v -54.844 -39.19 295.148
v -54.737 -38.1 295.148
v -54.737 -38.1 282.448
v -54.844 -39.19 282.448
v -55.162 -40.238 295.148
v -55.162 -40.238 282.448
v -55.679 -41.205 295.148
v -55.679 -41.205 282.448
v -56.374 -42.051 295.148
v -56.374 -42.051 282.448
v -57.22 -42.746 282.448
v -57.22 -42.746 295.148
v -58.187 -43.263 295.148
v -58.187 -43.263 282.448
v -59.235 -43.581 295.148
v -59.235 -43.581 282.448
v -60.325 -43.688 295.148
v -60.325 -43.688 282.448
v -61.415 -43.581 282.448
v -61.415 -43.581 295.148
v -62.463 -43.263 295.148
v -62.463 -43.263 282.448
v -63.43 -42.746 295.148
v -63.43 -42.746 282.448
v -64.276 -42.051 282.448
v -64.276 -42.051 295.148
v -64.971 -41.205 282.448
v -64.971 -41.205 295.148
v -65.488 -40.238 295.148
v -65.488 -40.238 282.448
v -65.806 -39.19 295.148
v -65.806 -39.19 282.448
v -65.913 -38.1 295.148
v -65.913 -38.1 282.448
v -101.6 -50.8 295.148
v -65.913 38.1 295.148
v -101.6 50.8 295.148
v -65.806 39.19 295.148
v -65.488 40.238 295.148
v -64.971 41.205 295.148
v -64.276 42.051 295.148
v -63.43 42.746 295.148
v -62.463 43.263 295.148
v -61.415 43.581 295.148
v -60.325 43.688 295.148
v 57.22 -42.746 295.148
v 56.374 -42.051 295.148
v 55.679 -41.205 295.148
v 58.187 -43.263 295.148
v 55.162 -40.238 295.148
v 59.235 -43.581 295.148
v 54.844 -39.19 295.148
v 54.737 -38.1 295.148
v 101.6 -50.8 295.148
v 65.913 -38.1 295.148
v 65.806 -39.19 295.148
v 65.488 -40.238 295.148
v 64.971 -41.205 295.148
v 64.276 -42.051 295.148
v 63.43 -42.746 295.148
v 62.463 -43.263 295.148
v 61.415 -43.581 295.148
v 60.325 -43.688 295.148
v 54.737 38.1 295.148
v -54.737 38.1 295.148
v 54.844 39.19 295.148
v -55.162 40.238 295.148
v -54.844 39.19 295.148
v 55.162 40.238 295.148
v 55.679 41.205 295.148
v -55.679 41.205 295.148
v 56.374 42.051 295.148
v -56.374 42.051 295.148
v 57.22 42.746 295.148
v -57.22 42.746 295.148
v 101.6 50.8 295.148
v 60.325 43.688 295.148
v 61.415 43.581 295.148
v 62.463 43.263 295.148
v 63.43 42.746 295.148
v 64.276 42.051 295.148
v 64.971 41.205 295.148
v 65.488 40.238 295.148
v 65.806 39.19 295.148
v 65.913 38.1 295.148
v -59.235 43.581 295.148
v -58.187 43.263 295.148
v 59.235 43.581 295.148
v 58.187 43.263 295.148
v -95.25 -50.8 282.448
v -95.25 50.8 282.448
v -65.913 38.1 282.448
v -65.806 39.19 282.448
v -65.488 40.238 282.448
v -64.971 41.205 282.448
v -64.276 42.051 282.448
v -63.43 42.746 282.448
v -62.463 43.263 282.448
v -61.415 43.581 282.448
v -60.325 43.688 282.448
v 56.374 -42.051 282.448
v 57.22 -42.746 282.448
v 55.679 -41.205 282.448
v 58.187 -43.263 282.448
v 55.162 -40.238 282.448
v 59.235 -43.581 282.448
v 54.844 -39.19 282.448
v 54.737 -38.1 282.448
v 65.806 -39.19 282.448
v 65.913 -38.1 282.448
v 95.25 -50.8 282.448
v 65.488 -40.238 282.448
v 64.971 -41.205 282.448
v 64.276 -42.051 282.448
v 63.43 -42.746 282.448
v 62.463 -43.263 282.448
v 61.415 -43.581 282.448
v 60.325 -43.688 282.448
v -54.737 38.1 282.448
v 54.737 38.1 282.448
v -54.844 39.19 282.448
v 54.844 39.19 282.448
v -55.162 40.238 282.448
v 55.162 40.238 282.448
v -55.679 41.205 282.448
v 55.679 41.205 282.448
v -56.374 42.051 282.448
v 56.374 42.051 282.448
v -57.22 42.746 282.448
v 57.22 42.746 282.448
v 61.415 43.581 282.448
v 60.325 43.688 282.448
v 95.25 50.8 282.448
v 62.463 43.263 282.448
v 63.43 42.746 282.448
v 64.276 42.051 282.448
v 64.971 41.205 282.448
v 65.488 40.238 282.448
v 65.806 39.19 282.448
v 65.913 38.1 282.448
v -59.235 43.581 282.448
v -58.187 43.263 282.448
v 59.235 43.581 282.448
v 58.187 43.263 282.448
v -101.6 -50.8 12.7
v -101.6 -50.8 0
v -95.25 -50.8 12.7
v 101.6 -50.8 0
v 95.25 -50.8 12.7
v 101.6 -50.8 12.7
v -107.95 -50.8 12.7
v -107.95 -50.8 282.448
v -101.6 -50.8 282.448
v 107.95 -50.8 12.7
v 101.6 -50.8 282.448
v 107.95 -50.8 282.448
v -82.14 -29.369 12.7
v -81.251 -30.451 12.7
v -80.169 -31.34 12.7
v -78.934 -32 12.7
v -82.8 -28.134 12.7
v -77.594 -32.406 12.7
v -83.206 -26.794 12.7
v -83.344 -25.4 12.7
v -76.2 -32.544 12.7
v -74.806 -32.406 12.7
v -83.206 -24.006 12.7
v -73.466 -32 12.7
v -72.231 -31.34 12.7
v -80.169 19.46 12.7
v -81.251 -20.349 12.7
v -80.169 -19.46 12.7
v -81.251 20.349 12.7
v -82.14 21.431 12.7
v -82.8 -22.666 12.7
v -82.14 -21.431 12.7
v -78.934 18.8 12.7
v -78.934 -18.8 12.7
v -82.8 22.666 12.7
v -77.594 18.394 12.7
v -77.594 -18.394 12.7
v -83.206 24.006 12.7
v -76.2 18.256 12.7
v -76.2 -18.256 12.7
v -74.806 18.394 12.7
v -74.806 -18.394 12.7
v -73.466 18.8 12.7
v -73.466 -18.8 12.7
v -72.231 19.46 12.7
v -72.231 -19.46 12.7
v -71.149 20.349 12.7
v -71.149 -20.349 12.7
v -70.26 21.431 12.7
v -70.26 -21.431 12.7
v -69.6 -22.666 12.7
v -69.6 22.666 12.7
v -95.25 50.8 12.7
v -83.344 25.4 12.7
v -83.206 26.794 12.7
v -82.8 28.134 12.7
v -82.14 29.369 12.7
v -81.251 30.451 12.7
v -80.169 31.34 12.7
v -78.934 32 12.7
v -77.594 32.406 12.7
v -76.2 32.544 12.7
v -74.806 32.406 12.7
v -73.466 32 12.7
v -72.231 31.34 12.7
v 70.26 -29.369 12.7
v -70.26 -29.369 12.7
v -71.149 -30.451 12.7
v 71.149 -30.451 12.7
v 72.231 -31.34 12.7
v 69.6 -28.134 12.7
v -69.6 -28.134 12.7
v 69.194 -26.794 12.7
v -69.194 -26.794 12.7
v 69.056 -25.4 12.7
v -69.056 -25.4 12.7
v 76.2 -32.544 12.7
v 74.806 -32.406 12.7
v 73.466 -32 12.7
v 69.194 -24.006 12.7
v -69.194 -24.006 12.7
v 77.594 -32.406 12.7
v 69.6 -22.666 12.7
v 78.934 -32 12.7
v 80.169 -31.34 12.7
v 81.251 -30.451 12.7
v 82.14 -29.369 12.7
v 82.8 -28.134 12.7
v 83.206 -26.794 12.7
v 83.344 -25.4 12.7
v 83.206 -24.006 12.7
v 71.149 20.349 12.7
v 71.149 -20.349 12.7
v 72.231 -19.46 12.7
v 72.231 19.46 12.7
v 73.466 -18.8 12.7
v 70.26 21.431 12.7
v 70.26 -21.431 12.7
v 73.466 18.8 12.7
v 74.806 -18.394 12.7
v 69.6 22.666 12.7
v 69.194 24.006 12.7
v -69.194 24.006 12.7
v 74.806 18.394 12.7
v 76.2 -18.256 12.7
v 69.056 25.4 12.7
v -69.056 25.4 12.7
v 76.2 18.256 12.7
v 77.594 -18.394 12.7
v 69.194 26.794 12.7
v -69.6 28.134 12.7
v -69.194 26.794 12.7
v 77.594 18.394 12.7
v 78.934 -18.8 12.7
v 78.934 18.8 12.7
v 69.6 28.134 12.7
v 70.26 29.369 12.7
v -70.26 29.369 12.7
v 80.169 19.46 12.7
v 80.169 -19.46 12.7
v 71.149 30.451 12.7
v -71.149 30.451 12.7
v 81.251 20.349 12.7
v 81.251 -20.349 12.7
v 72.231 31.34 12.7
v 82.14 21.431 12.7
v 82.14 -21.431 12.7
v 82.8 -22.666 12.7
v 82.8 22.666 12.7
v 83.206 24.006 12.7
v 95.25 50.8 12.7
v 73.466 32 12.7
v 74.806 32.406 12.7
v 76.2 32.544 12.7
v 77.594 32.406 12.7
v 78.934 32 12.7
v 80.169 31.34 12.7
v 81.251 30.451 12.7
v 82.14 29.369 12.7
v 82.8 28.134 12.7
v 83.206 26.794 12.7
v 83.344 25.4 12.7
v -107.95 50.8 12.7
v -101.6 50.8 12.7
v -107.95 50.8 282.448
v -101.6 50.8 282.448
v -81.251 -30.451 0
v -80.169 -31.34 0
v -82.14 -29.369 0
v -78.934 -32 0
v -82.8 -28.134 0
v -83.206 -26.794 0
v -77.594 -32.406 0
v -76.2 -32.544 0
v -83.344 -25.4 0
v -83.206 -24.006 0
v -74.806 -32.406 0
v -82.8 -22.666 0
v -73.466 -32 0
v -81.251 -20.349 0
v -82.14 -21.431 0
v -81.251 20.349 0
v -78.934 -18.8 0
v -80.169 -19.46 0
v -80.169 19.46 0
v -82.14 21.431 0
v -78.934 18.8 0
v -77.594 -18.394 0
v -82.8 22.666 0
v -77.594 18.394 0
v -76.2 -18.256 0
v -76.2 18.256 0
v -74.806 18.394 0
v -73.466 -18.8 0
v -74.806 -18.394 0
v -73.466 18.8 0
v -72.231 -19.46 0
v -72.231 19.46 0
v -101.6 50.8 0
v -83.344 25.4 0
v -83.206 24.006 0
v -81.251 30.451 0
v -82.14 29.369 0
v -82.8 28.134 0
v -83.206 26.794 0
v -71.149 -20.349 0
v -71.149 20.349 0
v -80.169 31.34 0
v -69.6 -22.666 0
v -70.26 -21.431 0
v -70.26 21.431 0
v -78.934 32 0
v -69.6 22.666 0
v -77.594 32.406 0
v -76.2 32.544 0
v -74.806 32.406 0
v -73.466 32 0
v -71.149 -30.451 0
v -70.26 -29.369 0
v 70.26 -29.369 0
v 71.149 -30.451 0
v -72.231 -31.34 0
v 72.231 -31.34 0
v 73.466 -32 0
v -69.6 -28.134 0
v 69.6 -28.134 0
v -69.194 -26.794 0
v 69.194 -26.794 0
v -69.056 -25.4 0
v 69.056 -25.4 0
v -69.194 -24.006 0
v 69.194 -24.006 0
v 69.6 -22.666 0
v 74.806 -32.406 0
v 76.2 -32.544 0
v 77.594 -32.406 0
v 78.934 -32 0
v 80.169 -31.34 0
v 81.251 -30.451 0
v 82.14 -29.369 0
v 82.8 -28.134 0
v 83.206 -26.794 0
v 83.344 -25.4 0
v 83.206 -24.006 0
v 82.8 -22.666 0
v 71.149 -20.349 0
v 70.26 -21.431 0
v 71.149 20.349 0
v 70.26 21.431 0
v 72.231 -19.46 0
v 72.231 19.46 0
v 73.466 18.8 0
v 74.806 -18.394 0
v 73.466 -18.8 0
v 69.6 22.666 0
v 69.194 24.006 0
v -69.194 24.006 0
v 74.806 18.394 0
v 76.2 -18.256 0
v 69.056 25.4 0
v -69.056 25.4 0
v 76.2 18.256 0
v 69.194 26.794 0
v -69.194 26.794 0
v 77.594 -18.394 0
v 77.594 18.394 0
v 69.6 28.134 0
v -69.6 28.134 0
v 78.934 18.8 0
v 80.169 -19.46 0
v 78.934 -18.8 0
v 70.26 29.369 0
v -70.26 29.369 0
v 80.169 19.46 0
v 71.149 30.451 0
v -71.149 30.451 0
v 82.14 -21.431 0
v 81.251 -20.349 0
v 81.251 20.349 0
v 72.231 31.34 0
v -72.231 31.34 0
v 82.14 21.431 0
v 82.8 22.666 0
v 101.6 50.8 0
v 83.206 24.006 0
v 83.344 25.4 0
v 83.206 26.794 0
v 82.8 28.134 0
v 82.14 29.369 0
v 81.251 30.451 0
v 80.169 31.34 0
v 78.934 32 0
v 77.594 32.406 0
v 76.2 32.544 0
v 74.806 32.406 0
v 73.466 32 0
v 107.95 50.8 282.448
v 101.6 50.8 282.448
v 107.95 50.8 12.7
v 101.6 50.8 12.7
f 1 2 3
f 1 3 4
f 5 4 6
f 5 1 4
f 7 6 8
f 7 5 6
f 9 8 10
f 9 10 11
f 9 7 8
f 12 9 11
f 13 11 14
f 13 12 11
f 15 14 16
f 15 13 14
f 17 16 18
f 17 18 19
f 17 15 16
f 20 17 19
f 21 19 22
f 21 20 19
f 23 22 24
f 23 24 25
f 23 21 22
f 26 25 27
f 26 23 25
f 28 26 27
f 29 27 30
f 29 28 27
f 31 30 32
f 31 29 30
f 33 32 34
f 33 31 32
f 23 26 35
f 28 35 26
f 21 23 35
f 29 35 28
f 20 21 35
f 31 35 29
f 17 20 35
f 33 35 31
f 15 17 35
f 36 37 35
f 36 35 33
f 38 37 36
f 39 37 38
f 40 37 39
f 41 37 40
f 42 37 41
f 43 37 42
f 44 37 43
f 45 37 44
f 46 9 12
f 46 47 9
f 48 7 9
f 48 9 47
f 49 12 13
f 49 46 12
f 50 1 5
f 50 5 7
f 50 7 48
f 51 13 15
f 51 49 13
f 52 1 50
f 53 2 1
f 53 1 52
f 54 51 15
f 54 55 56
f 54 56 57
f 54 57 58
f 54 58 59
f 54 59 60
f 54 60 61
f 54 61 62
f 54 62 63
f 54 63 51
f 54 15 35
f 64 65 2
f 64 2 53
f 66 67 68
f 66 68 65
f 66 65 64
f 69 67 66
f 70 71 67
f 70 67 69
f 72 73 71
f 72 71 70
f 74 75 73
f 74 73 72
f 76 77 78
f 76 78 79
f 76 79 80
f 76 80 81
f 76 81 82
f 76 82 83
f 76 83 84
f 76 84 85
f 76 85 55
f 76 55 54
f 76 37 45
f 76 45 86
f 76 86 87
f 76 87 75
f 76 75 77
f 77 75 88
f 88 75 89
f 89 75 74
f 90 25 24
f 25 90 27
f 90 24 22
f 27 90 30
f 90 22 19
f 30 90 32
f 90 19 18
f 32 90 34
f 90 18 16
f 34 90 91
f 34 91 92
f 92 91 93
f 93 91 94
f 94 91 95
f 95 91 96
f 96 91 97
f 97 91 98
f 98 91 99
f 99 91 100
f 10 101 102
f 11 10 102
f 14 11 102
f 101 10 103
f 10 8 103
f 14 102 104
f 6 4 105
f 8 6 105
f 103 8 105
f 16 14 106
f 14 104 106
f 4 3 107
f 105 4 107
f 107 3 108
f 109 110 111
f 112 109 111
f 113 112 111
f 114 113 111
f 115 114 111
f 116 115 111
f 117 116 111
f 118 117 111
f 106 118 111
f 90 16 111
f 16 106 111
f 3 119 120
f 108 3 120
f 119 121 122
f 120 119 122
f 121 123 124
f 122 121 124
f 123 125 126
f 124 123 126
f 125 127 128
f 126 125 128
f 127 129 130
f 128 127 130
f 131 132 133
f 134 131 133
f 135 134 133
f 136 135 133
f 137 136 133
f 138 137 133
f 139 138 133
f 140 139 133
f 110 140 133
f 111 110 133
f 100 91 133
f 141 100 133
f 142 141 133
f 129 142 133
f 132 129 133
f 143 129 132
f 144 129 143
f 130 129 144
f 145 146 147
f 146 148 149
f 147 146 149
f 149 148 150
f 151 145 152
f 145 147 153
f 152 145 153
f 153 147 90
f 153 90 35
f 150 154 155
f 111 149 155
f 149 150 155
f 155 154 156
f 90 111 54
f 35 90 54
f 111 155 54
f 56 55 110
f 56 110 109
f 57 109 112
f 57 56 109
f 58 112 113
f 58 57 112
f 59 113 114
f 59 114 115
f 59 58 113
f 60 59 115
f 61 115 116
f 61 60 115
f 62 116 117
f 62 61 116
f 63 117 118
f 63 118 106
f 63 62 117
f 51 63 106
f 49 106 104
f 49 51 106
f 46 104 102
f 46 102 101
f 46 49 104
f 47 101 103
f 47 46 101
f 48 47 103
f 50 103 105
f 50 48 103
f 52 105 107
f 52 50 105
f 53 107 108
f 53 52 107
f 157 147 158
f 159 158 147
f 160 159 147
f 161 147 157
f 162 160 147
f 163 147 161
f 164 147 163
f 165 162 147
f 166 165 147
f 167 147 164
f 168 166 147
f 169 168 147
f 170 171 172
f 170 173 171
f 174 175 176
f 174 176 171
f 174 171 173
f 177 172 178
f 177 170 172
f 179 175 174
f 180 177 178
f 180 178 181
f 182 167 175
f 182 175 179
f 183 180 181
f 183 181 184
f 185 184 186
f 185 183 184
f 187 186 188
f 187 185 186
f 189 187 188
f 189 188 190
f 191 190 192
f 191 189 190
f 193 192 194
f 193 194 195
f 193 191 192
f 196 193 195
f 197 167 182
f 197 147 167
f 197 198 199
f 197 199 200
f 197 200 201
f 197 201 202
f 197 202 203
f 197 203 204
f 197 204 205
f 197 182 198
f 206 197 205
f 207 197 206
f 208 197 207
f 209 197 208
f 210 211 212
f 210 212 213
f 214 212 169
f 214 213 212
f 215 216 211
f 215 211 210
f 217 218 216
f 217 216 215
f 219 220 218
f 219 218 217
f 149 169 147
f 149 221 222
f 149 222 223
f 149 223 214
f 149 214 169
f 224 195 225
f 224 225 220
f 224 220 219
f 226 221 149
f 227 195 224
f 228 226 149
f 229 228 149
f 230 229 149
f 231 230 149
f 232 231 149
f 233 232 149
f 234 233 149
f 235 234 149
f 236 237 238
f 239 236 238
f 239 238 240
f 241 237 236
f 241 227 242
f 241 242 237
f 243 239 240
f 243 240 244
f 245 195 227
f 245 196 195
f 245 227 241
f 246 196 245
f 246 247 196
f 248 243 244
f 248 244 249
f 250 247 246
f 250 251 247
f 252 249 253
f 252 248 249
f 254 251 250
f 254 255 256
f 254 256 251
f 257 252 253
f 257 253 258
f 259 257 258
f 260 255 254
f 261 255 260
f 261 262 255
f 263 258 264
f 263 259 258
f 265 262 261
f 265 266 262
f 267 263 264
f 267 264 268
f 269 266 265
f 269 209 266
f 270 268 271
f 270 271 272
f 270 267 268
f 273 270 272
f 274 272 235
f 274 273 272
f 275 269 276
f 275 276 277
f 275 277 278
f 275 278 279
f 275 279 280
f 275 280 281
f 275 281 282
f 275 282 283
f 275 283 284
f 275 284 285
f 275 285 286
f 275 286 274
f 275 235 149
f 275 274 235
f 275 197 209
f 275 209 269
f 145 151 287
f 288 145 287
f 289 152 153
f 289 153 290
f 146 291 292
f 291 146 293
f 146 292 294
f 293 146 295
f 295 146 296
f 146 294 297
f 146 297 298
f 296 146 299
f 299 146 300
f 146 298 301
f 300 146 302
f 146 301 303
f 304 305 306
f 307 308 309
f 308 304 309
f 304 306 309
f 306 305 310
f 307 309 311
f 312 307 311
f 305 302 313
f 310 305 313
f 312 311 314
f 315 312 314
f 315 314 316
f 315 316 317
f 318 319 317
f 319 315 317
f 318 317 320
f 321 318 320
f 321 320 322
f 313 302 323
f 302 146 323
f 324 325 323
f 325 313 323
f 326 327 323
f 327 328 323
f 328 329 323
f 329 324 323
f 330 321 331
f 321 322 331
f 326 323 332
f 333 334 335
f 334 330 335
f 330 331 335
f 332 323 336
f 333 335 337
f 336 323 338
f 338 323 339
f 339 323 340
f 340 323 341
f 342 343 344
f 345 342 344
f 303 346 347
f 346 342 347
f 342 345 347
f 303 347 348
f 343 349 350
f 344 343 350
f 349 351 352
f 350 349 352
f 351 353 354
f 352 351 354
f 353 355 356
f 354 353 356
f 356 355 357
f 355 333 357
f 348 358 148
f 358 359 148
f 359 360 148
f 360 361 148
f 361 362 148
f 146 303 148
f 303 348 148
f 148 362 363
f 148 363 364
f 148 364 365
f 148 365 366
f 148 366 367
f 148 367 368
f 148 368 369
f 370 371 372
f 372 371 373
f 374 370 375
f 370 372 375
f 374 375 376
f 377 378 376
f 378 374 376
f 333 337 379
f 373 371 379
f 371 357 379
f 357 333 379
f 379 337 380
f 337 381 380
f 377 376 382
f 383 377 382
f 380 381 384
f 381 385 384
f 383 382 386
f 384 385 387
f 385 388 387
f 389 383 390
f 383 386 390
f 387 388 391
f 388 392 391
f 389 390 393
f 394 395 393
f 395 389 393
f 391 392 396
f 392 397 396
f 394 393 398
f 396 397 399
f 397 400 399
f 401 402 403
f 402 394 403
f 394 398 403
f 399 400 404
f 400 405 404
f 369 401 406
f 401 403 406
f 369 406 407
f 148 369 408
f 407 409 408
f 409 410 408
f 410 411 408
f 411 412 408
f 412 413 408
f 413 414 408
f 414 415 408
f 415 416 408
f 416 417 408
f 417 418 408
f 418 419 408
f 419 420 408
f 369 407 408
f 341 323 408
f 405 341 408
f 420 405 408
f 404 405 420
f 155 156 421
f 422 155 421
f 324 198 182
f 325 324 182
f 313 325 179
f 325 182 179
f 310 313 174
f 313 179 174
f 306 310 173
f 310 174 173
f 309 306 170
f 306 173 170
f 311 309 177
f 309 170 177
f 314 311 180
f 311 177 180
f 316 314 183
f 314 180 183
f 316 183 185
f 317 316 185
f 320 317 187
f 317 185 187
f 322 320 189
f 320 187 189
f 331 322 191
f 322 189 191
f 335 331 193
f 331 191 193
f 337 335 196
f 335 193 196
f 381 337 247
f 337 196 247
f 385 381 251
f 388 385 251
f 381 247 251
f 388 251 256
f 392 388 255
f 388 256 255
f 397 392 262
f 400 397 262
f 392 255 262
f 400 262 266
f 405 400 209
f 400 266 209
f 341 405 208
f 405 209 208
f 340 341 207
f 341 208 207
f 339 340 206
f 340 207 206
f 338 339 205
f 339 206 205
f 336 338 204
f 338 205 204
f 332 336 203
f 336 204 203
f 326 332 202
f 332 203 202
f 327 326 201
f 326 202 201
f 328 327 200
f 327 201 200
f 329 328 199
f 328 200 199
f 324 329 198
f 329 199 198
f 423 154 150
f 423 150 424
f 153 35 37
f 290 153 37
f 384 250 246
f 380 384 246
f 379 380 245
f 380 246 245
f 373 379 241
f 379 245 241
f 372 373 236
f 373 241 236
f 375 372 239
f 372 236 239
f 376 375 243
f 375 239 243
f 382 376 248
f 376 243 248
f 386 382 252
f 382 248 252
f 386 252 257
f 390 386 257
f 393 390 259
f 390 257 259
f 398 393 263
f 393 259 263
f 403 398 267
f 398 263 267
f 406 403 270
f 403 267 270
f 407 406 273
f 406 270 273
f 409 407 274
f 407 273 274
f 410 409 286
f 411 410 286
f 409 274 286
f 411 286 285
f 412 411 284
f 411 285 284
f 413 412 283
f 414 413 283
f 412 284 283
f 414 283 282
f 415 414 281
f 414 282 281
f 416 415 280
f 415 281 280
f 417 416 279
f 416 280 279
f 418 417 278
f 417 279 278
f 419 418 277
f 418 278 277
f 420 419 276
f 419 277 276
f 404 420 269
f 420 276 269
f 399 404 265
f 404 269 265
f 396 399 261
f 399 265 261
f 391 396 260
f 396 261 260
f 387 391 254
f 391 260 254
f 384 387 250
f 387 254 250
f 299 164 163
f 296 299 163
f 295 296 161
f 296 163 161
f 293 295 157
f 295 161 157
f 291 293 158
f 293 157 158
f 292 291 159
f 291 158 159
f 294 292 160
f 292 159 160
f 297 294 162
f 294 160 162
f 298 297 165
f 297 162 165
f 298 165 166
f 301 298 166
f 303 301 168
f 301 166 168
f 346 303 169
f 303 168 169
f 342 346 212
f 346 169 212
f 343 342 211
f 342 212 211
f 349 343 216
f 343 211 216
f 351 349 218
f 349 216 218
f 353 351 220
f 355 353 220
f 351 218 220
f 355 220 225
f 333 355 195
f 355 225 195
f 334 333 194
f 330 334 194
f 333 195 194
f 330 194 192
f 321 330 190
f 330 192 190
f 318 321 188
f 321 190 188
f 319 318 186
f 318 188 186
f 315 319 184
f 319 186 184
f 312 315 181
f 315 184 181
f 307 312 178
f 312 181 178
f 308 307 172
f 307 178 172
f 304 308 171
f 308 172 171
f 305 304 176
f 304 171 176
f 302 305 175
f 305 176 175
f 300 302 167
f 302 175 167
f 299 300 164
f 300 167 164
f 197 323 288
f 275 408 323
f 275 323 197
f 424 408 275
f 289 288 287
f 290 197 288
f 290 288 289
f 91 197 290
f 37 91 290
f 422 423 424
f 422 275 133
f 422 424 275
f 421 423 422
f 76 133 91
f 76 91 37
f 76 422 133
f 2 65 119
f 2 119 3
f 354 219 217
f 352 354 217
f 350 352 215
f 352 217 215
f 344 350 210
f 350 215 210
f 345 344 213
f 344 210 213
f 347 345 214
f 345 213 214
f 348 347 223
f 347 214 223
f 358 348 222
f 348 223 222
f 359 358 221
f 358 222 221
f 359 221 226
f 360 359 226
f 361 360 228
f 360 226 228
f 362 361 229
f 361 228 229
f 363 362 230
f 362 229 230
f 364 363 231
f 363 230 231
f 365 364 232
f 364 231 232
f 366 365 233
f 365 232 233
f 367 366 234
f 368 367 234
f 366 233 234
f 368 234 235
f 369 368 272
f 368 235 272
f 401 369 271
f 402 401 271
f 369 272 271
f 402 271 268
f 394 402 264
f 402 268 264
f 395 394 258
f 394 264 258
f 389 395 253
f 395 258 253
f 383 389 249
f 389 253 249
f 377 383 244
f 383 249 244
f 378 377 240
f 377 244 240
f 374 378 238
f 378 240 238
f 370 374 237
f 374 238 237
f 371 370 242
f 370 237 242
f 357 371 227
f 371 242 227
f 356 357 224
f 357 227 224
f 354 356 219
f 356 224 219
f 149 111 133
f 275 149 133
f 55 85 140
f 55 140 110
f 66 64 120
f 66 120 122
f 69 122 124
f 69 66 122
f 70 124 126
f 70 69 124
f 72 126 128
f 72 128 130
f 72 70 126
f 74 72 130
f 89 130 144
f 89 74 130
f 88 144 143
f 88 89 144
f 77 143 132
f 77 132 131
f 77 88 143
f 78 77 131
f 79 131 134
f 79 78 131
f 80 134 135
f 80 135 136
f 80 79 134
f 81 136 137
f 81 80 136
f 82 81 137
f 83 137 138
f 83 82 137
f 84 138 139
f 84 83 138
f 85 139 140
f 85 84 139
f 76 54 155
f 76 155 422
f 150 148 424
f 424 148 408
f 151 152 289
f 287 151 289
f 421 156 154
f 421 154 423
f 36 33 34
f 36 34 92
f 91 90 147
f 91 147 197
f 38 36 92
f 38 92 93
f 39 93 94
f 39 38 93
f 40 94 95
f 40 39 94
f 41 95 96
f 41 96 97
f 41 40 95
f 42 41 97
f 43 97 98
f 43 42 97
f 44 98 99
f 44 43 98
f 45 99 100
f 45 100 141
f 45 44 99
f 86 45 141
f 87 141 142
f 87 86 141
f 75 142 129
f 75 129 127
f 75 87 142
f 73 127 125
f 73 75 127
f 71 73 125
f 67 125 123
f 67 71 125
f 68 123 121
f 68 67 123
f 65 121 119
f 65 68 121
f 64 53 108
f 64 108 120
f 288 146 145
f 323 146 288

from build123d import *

# Parameters (mm, degrees)
F0_W     = 203.2
F0_H     = 101.6
F1_DEPTH = 12.7
F2_D     = 14.2875
F4_W     = 203.2
F4_H     = 101.6
F5_DEPTH = 12.7
F6_W     = 101.6
F6_H     = 269.748
F7_DEPTH = 6.35


with BuildPart() as f1:
    # F0 (on Top) → F1 (new body)
    with BuildSketch(Plane.XY):
        Rectangle(F0_W, F0_H)
    extrude(amount=F1_DEPTH)

    # F2 (through all)
    with Locations(Plane(origin=(0, 0, 0), x_dir=(1, 0, 0), z_dir=(0, 0, -1))):
        with Locations((-76.2, 25.4), (-76.2, -25.4), (76.2, -25.4), (76.2, 25.4)):
            Hole(F2_D / 2)



with BuildPart() as f5:
    # F4 (on offset) → F5 (new body)
    with BuildSketch(Plane.XY.offset(295.148)):
        Rectangle(F4_W, F4_H)
        with BuildLine():
            Line((-65.913, -38.1), (-65.913, 38.1))
            ThreePointArc((-65.913, 38.1), (-60.325, 43.688), (-54.737, 38.1))
            Line((-54.737, 38.1), (-54.737, -38.1))
            ThreePointArc((-54.737, -38.1), (-60.325, -43.688), (-65.913, -38.1))
        make_face(mode=Mode.SUBTRACT)
        with BuildLine():
            ThreePointArc((54.737, 38.1), (60.325, 43.688), (65.913, 38.1))
            Line((65.913, 38.1), (65.913, -38.1))
            ThreePointArc((65.913, -38.1), (60.325, -43.688), (54.737, -38.1))
            Line((54.737, -38.1), (54.737, 38.1))
        make_face(mode=Mode.SUBTRACT)
    extrude(amount=-F5_DEPTH)


with BuildPart() as f1_1:
    add(f1.part)

    add(f5.part)  # F7 merges F5
    # F6 (on face) → F7 (join, symmetric)
    with BuildSketch(Plane.YZ.offset(101.6)):
        with Locations((0, 147.574)):
            Rectangle(F6_W, F6_H)
    extrude(amount=F7_DEPTH, both=True)

    # F8: F1 across plane


with BuildPart() as f1_2:
    add(f1_1.part)
    add(f1_1.part.mirror(Plane.YZ))


solid = f1_2.part
